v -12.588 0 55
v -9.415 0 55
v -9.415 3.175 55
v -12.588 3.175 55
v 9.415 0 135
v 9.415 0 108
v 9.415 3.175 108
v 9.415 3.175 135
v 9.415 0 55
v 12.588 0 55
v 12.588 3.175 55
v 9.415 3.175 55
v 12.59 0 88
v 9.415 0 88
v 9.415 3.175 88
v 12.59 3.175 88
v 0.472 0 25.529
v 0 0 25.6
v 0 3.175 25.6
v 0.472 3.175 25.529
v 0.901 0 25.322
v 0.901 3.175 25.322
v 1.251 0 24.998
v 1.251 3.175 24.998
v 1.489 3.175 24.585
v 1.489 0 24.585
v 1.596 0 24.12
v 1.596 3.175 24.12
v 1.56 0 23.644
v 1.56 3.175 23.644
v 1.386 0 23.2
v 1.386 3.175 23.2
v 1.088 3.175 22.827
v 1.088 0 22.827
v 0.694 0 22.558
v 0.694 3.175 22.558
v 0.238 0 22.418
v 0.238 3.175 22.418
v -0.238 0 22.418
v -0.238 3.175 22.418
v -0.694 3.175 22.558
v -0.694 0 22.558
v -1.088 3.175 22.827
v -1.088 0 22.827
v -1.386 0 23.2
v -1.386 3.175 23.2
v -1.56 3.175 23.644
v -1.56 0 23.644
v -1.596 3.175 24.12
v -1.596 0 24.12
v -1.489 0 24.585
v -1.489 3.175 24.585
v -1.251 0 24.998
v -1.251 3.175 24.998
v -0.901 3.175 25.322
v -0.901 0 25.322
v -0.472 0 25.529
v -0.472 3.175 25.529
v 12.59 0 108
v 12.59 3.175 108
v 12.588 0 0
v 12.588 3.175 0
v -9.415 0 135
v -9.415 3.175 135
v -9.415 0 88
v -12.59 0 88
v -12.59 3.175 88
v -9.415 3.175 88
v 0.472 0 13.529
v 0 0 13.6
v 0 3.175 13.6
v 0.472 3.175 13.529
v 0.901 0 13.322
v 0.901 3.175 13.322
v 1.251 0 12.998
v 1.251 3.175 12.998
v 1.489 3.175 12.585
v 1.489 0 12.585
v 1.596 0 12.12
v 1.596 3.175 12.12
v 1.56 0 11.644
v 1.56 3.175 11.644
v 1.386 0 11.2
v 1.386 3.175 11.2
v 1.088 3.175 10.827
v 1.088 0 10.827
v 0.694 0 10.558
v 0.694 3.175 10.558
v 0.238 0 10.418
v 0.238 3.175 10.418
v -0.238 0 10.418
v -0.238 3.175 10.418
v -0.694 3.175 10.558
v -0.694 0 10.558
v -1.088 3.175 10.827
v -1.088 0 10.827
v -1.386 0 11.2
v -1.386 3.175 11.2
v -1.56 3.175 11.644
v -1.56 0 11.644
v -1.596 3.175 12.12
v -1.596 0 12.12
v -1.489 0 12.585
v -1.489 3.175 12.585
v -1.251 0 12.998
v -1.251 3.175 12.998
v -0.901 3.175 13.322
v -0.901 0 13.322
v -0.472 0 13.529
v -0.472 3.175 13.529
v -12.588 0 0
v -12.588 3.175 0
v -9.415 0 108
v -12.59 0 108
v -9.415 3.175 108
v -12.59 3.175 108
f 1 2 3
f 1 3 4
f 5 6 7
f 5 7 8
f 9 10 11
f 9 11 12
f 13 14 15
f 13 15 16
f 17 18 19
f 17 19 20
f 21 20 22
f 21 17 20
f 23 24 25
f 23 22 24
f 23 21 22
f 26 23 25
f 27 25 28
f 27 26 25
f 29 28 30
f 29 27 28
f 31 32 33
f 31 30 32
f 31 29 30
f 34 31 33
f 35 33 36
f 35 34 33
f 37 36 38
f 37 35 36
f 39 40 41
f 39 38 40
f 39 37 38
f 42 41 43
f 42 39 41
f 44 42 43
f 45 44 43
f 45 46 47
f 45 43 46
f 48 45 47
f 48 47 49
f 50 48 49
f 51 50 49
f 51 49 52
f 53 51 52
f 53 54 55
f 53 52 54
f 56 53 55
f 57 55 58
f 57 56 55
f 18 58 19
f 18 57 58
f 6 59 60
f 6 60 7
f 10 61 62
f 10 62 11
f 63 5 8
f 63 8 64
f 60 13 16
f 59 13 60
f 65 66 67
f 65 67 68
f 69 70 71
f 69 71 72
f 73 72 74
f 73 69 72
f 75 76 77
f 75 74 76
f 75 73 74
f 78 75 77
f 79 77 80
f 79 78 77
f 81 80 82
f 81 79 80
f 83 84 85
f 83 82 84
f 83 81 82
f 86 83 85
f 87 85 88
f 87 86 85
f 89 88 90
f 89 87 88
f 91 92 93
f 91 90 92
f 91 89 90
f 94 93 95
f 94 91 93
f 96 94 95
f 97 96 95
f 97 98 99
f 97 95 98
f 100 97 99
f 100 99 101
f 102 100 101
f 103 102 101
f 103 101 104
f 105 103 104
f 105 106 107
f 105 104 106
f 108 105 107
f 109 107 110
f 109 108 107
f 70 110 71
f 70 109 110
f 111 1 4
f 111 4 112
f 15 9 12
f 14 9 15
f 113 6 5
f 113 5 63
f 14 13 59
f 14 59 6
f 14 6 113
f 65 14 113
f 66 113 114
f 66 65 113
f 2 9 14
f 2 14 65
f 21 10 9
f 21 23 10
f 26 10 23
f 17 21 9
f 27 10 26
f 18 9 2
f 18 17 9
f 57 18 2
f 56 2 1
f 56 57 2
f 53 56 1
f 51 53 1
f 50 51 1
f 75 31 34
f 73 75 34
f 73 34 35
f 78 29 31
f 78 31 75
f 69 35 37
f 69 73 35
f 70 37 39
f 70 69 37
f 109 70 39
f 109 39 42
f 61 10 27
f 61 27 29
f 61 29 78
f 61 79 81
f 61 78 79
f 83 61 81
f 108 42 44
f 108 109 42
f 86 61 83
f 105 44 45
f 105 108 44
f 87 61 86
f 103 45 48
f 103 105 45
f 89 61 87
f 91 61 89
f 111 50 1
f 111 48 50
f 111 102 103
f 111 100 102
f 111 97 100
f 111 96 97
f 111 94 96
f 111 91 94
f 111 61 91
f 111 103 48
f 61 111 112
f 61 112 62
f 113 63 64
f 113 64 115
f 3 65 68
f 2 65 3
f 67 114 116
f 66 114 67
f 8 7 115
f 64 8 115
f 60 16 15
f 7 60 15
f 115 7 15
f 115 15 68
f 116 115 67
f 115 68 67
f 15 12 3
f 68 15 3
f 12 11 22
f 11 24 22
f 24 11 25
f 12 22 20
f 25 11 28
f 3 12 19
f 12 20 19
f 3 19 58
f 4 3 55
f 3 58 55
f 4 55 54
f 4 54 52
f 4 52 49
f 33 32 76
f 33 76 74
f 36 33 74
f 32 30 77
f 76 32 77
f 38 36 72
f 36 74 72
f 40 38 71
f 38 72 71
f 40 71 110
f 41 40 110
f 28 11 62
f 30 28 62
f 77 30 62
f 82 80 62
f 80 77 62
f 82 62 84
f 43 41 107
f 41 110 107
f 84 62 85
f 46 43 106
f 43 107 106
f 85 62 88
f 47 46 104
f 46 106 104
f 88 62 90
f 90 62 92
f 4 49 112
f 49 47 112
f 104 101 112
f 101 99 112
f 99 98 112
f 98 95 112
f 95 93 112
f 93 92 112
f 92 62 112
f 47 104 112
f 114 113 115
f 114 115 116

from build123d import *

# Parameters (mm, degrees)
BOSS_EXTRUDE1_DEPTH     = 3.175
CUT_EXTRUDE1_DEPTH      = 136.62296533
CUT_EXTRUDE1_DEPTH_BACK = 136.62296533
SKETCH2_R               = 1.6


with BuildPart() as part:
    # Sketch1 → Boss-Extrude1 (new body)
    with BuildSketch(Plane(origin=(0, 0, 0), x_dir=(1, 0, 0), z_dir=(0, 1, 0))):
        Polygon((-12.5875, 0), (12.5875, 0), (12.5875, -55), (9.415, -55), (9.415, -88), (12.59, -88), (12.59, -108), (9.415, -108), (9.415, -135), (-9.415, -135), (-9.415, -108), (-12.59, -108), (-12.59, -88), (-9.415, -88), (-9.415, -55), (-12.5875, -55), align=None)
    extrude(amount=BOSS_EXTRUDE1_DEPTH)

    # Sketch2 → Cut-Extrude1 (cut, two sides: drawn at the far end of the back side and taken through both)
    with BuildSketch(Plane(origin=(0, 3.175, 0), x_dir=(1, 0, 0), z_dir=(0, 1, 0)).offset(-CUT_EXTRUDE1_DEPTH_BACK)):
        with Locations(Location((0, -24, 0), (0, 0, 270))):
            Circle(SKETCH2_R)
        with Locations(Location((0, -12, 0), (0, 0, 270))):
            Circle(SKETCH2_R)
    extrude(amount=CUT_EXTRUDE1_DEPTH + CUT_EXTRUDE1_DEPTH_BACK, mode=Mode.SUBTRACT)


solid = part.part
